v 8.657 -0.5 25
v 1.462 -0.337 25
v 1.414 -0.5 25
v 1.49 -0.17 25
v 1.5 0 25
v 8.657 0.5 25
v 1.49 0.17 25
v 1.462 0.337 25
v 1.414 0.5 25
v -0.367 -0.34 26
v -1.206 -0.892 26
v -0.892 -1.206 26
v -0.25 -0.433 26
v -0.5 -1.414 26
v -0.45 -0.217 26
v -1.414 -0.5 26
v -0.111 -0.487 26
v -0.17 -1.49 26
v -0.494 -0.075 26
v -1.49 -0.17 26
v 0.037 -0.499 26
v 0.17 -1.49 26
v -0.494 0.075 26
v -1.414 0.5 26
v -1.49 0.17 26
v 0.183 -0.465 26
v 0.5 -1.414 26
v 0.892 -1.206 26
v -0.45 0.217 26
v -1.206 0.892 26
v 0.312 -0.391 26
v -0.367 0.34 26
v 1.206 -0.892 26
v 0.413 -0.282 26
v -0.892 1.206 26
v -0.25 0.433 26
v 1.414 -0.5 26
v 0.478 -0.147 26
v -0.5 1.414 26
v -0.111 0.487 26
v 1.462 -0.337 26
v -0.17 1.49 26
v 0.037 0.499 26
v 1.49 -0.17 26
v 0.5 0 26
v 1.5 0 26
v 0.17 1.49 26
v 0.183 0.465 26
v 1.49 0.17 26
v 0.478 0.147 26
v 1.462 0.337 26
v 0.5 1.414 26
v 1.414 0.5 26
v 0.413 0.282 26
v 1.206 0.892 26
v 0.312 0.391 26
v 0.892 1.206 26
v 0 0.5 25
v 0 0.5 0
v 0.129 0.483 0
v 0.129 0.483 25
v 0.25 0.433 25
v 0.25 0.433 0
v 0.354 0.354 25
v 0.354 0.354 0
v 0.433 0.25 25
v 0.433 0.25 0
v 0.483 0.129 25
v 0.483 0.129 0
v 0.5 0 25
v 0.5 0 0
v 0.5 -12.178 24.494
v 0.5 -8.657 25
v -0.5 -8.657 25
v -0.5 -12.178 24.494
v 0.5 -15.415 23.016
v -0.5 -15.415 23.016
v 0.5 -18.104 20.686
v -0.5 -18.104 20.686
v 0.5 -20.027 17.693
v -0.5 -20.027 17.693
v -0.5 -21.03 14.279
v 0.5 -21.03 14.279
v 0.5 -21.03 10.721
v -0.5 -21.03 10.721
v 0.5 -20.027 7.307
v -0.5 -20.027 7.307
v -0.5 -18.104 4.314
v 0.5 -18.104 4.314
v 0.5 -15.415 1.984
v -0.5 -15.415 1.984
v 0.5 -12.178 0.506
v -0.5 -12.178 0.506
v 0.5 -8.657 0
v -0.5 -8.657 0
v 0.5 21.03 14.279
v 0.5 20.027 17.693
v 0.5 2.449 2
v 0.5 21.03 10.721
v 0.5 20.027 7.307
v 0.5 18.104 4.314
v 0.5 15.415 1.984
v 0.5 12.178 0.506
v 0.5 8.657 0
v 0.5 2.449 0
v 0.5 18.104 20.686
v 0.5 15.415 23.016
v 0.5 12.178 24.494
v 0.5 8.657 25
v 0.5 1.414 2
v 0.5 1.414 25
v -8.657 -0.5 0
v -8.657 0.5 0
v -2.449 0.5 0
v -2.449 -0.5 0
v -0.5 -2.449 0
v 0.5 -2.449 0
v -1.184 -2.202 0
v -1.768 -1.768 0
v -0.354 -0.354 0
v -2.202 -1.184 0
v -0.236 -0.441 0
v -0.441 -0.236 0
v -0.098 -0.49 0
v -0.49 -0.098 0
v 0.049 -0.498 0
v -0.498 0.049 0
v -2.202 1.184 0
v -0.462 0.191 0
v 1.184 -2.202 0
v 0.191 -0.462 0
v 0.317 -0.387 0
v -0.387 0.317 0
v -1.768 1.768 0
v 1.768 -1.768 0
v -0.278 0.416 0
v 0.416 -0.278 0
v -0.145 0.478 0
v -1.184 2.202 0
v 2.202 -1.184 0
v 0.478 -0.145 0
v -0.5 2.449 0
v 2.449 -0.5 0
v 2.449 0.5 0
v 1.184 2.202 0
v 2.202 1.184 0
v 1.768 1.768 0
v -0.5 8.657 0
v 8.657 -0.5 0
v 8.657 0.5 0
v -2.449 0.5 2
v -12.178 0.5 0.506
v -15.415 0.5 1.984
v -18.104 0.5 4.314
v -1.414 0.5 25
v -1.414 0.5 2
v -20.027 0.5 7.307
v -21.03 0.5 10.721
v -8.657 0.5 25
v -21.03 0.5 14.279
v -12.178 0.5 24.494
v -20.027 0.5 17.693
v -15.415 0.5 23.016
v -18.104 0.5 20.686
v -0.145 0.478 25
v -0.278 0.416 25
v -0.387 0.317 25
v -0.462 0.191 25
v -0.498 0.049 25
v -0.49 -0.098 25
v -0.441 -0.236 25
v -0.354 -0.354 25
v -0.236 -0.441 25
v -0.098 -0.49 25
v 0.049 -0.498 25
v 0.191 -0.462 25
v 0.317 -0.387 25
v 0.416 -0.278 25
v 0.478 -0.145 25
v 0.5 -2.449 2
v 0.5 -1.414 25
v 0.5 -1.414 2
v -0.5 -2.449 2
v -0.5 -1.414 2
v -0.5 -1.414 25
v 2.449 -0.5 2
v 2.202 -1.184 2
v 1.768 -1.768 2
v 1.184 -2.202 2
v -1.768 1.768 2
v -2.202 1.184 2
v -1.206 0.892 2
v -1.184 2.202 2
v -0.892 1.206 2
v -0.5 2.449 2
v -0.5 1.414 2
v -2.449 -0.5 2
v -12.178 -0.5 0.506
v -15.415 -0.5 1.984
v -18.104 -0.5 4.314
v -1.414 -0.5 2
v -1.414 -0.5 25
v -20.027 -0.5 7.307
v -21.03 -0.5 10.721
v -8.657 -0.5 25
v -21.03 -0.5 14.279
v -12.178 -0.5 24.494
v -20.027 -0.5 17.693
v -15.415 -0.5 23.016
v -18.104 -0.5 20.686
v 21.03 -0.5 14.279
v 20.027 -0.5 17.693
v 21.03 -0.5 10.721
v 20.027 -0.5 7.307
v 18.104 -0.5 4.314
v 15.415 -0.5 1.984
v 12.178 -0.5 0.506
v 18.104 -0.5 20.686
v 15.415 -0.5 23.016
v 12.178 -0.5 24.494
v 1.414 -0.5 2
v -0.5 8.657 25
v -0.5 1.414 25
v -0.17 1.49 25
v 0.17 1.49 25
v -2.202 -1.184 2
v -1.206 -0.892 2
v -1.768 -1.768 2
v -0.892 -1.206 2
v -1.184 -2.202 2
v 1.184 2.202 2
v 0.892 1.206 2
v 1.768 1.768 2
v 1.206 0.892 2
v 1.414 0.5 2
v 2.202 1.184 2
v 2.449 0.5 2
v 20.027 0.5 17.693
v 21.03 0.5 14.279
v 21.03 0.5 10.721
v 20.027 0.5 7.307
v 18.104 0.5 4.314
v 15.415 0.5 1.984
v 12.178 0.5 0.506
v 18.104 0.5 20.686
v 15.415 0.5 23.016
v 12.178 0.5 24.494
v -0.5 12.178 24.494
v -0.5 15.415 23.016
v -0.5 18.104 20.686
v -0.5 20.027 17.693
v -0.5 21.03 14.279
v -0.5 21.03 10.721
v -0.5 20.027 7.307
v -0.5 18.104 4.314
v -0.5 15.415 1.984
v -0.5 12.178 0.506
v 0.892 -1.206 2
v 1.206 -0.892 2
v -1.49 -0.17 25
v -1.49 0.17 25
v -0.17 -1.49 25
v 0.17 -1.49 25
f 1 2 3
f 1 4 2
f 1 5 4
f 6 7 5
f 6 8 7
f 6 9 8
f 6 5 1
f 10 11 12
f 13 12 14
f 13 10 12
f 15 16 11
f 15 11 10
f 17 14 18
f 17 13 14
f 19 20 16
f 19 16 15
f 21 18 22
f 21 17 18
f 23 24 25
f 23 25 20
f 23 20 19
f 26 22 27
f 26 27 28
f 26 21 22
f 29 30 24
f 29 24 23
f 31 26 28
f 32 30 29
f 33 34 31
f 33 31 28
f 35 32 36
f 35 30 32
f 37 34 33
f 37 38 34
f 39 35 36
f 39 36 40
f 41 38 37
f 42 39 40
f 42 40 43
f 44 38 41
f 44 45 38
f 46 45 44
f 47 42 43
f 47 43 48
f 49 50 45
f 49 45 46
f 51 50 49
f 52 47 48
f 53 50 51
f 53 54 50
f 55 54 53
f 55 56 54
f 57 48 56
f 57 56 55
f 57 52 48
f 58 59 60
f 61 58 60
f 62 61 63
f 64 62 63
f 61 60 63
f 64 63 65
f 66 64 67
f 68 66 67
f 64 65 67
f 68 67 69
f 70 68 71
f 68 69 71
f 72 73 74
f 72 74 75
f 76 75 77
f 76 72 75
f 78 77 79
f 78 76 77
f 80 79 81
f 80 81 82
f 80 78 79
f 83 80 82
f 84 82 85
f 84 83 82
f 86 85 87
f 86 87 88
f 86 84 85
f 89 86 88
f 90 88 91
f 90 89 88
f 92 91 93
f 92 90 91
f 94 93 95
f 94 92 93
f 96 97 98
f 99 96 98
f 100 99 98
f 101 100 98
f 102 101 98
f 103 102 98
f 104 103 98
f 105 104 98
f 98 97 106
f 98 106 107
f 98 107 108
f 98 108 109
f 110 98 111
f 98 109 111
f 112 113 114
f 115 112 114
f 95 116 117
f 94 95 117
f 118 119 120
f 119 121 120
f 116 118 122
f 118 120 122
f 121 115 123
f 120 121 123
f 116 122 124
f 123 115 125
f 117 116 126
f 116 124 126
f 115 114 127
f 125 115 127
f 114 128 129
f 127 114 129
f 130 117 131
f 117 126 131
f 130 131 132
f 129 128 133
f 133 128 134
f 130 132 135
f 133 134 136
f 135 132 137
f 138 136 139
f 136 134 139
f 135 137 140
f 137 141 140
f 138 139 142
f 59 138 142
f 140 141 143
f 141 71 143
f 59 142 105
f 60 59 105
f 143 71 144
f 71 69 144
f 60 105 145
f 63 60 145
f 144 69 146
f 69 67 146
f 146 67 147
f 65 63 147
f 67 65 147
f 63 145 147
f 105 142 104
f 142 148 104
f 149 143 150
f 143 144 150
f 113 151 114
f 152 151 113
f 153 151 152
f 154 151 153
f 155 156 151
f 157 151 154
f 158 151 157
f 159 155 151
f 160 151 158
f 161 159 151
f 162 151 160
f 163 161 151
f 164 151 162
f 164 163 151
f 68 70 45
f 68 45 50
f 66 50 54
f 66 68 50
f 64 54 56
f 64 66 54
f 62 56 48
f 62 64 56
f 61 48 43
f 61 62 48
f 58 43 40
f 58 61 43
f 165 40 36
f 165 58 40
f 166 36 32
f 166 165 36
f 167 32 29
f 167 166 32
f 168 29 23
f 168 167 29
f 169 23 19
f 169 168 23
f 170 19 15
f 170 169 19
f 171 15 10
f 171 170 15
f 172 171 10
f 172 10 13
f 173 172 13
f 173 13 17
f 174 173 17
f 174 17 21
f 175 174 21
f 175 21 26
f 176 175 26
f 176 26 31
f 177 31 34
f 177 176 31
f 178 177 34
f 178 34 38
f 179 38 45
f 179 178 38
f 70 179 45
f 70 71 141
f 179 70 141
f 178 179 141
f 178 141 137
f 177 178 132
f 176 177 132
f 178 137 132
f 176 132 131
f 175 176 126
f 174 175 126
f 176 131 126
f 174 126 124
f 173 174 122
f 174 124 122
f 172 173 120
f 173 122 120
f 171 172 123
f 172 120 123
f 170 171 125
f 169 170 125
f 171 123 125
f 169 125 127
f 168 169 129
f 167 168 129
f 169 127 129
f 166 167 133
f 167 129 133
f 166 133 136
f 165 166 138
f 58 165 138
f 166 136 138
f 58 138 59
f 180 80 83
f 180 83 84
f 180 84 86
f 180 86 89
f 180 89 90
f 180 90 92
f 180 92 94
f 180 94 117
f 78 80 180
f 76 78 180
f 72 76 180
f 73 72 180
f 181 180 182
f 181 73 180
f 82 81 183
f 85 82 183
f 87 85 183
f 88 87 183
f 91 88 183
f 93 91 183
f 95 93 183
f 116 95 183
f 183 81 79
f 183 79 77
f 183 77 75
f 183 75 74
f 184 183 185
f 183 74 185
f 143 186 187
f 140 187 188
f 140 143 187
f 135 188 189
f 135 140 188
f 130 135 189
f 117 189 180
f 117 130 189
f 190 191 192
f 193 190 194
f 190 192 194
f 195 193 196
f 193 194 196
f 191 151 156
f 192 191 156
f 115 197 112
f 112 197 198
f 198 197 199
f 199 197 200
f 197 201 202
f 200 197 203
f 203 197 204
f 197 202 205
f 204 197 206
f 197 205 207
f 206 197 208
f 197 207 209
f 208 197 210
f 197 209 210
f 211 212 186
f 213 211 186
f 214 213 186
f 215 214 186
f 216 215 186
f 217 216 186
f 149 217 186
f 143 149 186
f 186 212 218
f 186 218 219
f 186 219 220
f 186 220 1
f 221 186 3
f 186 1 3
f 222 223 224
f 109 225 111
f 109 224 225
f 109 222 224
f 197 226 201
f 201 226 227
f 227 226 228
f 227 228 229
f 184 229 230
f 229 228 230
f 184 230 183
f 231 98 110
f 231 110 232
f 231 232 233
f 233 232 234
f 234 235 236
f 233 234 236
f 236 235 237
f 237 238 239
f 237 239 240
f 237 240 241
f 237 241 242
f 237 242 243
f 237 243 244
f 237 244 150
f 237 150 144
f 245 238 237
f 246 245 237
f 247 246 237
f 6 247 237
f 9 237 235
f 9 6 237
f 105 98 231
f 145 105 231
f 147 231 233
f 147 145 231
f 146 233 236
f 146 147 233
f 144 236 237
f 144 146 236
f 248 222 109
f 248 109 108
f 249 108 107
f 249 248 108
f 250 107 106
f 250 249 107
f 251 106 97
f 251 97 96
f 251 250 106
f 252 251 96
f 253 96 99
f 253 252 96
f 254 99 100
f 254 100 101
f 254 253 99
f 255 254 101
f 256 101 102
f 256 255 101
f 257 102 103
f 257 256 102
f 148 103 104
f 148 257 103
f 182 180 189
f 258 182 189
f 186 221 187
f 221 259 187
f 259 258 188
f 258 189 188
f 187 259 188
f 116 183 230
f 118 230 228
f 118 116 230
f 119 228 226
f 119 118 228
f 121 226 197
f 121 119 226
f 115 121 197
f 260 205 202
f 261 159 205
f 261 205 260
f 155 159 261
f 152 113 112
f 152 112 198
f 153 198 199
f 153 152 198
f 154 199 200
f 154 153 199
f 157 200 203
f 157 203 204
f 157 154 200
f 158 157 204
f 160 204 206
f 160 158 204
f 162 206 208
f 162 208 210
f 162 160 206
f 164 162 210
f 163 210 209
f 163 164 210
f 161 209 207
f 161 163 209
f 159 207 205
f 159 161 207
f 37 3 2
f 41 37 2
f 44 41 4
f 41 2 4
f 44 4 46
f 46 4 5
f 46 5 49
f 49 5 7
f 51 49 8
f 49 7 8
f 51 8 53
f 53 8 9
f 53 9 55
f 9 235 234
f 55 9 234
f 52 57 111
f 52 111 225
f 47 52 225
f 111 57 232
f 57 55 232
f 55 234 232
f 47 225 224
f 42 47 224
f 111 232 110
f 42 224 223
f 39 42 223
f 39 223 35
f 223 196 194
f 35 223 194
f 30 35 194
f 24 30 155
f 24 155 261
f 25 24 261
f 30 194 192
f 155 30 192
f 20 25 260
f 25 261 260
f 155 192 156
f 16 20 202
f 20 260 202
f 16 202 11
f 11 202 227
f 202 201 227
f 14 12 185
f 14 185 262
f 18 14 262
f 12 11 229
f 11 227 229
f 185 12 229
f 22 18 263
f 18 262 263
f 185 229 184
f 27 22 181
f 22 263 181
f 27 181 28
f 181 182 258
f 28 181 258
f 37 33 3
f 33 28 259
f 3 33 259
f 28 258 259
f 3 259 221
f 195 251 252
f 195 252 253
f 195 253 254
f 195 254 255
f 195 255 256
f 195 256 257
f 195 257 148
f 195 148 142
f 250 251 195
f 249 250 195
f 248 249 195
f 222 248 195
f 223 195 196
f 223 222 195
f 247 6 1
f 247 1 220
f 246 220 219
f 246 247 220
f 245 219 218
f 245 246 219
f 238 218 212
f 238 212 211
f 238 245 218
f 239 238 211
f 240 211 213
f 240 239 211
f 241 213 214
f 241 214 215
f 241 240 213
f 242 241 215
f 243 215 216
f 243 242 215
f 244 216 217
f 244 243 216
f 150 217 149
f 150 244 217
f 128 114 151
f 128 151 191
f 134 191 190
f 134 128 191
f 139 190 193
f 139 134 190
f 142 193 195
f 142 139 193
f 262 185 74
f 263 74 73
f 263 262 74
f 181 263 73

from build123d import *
from build123d import SkipClean  # not in build123d's __all__

# Parameters (mm, degrees)
F1_DEPTH  = 25
F2_R      = 0.5
F3_DEPTH  = 1
F4_R      = 2.5
F4_R_2    = 0.5
F5_DEPTH  = 2
F7_DEPTH  = 1
F9_DEPTH  = 1
F11_DEPTH = 1
F12_DEPTH = 1
F14_DEPTH = 1


# Not quite as in the source:
# - a feature names something its author has since deleted; it is built from what else it names


with BuildPart() as f1:
    # F0 (on Top) → F1 (new body)
    with BuildSketch(Plane.XY):
        with BuildLine():
            Line((-8.65676943, -0.5), (-1.4142135624, -0.5))
            ThreePointArc((-1.4142135624, -0.5), (-1.0606601718, -1.0606601718), (-0.5, -1.4142135624))
            Line((-0.5, -1.4142135624), (-0.5, -8.65676943))
            Line((-0.5, -8.65676943), (0.5, -8.65676943))
            Line((0.5, -8.65676943), (0.5, -1.4142135624))
            ThreePointArc((0.5, -1.4142135624), (1.0606601718, -1.0606601718), (1.4142135624, -0.5))
            Line((1.4142135624, -0.5), (8.65676943, -0.5))
            Line((8.65676943, -0.5), (8.65676943, 0.5))
            Line((8.65676943, 0.5), (1.4142135624, 0.5))
            ThreePointArc((1.4142135624, 0.5), (1.0606601718, 1.0606601718), (0.5, 1.4142135624))
            Line((0.5, 1.4142135624), (0.5, 8.65676943))
            Line((0.5, 8.65676943), (-0.5, 8.65676943))
            Line((-0.5, 8.65676943), (-0.5, 1.4142135624))
            ThreePointArc((-0.5, 1.4142135624), (-1.0606601718, 1.0606601718), (-1.4142135624, 0.5))
            Line((-1.4142135624, 0.5), (-8.65676943, 0.5))
            Line((-8.65676943, 0.5), (-8.65676943, -0.5))
        make_face()
        with BuildLine():
            ThreePointArc((0, 0.5), (0.3535533906, 0.3535533906), (0.5, 0))
            ThreePointArc((0.5, 0), (-0.3535533906, -0.3535533906), (0, 0.5))
        make_face(mode=Mode.SUBTRACT)
    extrude(amount=F1_DEPTH)

    # F2 (on face) → F3 (join)
    with BuildSketch(Plane.XY.offset(25)):
        with BuildLine():
            ThreePointArc((1.4142135624, -0.5), (1.4783978395, -0.2536529681), (1.5, 0))
            ThreePointArc((1.5, 0), (1.4783978395, 0.2536529681), (1.4142135624, 0.5))
            ThreePointArc((1.4142135624, 0.5), (1.0606601718, 1.0606601718), (0.5, 1.4142135624))
            ThreePointArc((0.5, 1.4142135624), (0, 1.5), (-0.5, 1.4142135624))
            ThreePointArc((-0.5, 1.4142135624), (-1.0606601718, 1.0606601718), (-1.4142135624, 0.5))
            ThreePointArc((-1.4142135624, 0.5), (-1.5, 0), (-1.4142135624, -0.5))
            ThreePointArc((-1.4142135624, -0.5), (-1.0606601718, -1.0606601718), (-0.5, -1.4142135624))
            ThreePointArc((-0.5, -1.4142135624), (0, -1.5), (0.5, -1.4142135624))
            ThreePointArc((0.5, -1.4142135624), (1.0606601718, -1.0606601718), (1.4142135624, -0.5))
        make_face()
        Circle(F2_R, mode=Mode.SUBTRACT)
    with SkipClean():  # cleaning this boolean's faces spoils the solid; the shape is the same uncleaned
        extrude(amount=F3_DEPTH)

    # F4 (on face) → F5 (join)
    with BuildSketch(Plane(origin=(0, 0, 0), x_dir=(1, 0, 0), z_dir=(0, 0, -1))):
        Circle(F4_R)
        Circle(F4_R_2, mode=Mode.SUBTRACT)
    extrude(amount=-F5_DEPTH)

    # F6 (on face) → F7 (join)
    with BuildSketch(Plane.YZ.offset(0.5)):
        with BuildLine():
            Line((-8.65676943, 0), (-8.65676943, 25))
            ThreePointArc((-8.65676943, 25), (-21.15676943, 12.5), (-8.65676943, 0))
        make_face()
    extrude(amount=-F7_DEPTH)

    # F8 (on face) → F9 (join)
    with BuildSketch(Plane(origin=(0, 0.5, 0), x_dir=(-1, 0, 0), z_dir=(0, 1, 0))):
        with BuildLine():
            Line((8.65676943, 25), (8.65676943, 0))
            ThreePointArc((8.65676943, 0), (21.15676943, 12.5), (8.65676943, 25))
        make_face()
    extrude(amount=-F9_DEPTH)

    # F10 (on face) → F11 (join)
    with BuildSketch(Plane(origin=(-0.5, 0, 0), x_dir=(0, -1, 0), z_dir=(-1, 0, 0))):
        with BuildLine():
            Line((-8.65676943, 0), (-8.65676943, 25))
            ThreePointArc((-8.65676943, 25), (-21.15676943, 12.5), (-8.65676943, 0))
        make_face()
    extrude(amount=-F11_DEPTH)


with BuildPart() as f12:
    # F12 (new): a face of the model
    f12_faces = [f1.part.faces().sort_by_distance(p)[0] for p in [
        (5.0713936624, 0.5, 12.63302926),
    ]]
    extrude(f12_faces, amount=-F12_DEPTH)


with BuildPart() as f1_1:
    add(f1.part, clean=False)

    add(f12.part)  # F14 merges F12
    # F13 (on face) → F14 (join)
    with BuildSketch(Plane(origin=(0, 0.5, 0), x_dir=(-1, 0, 0), z_dir=(0, 1, 0))):
        with BuildLine():
            Line((-8.65676943, 0), (-8.65676943, 25))
            ThreePointArc((-8.65676943, 25), (-21.15676943, 12.5), (-8.65676943, 0))
        make_face()
    extrude(amount=-F14_DEPTH)


solid = f1_1.part
